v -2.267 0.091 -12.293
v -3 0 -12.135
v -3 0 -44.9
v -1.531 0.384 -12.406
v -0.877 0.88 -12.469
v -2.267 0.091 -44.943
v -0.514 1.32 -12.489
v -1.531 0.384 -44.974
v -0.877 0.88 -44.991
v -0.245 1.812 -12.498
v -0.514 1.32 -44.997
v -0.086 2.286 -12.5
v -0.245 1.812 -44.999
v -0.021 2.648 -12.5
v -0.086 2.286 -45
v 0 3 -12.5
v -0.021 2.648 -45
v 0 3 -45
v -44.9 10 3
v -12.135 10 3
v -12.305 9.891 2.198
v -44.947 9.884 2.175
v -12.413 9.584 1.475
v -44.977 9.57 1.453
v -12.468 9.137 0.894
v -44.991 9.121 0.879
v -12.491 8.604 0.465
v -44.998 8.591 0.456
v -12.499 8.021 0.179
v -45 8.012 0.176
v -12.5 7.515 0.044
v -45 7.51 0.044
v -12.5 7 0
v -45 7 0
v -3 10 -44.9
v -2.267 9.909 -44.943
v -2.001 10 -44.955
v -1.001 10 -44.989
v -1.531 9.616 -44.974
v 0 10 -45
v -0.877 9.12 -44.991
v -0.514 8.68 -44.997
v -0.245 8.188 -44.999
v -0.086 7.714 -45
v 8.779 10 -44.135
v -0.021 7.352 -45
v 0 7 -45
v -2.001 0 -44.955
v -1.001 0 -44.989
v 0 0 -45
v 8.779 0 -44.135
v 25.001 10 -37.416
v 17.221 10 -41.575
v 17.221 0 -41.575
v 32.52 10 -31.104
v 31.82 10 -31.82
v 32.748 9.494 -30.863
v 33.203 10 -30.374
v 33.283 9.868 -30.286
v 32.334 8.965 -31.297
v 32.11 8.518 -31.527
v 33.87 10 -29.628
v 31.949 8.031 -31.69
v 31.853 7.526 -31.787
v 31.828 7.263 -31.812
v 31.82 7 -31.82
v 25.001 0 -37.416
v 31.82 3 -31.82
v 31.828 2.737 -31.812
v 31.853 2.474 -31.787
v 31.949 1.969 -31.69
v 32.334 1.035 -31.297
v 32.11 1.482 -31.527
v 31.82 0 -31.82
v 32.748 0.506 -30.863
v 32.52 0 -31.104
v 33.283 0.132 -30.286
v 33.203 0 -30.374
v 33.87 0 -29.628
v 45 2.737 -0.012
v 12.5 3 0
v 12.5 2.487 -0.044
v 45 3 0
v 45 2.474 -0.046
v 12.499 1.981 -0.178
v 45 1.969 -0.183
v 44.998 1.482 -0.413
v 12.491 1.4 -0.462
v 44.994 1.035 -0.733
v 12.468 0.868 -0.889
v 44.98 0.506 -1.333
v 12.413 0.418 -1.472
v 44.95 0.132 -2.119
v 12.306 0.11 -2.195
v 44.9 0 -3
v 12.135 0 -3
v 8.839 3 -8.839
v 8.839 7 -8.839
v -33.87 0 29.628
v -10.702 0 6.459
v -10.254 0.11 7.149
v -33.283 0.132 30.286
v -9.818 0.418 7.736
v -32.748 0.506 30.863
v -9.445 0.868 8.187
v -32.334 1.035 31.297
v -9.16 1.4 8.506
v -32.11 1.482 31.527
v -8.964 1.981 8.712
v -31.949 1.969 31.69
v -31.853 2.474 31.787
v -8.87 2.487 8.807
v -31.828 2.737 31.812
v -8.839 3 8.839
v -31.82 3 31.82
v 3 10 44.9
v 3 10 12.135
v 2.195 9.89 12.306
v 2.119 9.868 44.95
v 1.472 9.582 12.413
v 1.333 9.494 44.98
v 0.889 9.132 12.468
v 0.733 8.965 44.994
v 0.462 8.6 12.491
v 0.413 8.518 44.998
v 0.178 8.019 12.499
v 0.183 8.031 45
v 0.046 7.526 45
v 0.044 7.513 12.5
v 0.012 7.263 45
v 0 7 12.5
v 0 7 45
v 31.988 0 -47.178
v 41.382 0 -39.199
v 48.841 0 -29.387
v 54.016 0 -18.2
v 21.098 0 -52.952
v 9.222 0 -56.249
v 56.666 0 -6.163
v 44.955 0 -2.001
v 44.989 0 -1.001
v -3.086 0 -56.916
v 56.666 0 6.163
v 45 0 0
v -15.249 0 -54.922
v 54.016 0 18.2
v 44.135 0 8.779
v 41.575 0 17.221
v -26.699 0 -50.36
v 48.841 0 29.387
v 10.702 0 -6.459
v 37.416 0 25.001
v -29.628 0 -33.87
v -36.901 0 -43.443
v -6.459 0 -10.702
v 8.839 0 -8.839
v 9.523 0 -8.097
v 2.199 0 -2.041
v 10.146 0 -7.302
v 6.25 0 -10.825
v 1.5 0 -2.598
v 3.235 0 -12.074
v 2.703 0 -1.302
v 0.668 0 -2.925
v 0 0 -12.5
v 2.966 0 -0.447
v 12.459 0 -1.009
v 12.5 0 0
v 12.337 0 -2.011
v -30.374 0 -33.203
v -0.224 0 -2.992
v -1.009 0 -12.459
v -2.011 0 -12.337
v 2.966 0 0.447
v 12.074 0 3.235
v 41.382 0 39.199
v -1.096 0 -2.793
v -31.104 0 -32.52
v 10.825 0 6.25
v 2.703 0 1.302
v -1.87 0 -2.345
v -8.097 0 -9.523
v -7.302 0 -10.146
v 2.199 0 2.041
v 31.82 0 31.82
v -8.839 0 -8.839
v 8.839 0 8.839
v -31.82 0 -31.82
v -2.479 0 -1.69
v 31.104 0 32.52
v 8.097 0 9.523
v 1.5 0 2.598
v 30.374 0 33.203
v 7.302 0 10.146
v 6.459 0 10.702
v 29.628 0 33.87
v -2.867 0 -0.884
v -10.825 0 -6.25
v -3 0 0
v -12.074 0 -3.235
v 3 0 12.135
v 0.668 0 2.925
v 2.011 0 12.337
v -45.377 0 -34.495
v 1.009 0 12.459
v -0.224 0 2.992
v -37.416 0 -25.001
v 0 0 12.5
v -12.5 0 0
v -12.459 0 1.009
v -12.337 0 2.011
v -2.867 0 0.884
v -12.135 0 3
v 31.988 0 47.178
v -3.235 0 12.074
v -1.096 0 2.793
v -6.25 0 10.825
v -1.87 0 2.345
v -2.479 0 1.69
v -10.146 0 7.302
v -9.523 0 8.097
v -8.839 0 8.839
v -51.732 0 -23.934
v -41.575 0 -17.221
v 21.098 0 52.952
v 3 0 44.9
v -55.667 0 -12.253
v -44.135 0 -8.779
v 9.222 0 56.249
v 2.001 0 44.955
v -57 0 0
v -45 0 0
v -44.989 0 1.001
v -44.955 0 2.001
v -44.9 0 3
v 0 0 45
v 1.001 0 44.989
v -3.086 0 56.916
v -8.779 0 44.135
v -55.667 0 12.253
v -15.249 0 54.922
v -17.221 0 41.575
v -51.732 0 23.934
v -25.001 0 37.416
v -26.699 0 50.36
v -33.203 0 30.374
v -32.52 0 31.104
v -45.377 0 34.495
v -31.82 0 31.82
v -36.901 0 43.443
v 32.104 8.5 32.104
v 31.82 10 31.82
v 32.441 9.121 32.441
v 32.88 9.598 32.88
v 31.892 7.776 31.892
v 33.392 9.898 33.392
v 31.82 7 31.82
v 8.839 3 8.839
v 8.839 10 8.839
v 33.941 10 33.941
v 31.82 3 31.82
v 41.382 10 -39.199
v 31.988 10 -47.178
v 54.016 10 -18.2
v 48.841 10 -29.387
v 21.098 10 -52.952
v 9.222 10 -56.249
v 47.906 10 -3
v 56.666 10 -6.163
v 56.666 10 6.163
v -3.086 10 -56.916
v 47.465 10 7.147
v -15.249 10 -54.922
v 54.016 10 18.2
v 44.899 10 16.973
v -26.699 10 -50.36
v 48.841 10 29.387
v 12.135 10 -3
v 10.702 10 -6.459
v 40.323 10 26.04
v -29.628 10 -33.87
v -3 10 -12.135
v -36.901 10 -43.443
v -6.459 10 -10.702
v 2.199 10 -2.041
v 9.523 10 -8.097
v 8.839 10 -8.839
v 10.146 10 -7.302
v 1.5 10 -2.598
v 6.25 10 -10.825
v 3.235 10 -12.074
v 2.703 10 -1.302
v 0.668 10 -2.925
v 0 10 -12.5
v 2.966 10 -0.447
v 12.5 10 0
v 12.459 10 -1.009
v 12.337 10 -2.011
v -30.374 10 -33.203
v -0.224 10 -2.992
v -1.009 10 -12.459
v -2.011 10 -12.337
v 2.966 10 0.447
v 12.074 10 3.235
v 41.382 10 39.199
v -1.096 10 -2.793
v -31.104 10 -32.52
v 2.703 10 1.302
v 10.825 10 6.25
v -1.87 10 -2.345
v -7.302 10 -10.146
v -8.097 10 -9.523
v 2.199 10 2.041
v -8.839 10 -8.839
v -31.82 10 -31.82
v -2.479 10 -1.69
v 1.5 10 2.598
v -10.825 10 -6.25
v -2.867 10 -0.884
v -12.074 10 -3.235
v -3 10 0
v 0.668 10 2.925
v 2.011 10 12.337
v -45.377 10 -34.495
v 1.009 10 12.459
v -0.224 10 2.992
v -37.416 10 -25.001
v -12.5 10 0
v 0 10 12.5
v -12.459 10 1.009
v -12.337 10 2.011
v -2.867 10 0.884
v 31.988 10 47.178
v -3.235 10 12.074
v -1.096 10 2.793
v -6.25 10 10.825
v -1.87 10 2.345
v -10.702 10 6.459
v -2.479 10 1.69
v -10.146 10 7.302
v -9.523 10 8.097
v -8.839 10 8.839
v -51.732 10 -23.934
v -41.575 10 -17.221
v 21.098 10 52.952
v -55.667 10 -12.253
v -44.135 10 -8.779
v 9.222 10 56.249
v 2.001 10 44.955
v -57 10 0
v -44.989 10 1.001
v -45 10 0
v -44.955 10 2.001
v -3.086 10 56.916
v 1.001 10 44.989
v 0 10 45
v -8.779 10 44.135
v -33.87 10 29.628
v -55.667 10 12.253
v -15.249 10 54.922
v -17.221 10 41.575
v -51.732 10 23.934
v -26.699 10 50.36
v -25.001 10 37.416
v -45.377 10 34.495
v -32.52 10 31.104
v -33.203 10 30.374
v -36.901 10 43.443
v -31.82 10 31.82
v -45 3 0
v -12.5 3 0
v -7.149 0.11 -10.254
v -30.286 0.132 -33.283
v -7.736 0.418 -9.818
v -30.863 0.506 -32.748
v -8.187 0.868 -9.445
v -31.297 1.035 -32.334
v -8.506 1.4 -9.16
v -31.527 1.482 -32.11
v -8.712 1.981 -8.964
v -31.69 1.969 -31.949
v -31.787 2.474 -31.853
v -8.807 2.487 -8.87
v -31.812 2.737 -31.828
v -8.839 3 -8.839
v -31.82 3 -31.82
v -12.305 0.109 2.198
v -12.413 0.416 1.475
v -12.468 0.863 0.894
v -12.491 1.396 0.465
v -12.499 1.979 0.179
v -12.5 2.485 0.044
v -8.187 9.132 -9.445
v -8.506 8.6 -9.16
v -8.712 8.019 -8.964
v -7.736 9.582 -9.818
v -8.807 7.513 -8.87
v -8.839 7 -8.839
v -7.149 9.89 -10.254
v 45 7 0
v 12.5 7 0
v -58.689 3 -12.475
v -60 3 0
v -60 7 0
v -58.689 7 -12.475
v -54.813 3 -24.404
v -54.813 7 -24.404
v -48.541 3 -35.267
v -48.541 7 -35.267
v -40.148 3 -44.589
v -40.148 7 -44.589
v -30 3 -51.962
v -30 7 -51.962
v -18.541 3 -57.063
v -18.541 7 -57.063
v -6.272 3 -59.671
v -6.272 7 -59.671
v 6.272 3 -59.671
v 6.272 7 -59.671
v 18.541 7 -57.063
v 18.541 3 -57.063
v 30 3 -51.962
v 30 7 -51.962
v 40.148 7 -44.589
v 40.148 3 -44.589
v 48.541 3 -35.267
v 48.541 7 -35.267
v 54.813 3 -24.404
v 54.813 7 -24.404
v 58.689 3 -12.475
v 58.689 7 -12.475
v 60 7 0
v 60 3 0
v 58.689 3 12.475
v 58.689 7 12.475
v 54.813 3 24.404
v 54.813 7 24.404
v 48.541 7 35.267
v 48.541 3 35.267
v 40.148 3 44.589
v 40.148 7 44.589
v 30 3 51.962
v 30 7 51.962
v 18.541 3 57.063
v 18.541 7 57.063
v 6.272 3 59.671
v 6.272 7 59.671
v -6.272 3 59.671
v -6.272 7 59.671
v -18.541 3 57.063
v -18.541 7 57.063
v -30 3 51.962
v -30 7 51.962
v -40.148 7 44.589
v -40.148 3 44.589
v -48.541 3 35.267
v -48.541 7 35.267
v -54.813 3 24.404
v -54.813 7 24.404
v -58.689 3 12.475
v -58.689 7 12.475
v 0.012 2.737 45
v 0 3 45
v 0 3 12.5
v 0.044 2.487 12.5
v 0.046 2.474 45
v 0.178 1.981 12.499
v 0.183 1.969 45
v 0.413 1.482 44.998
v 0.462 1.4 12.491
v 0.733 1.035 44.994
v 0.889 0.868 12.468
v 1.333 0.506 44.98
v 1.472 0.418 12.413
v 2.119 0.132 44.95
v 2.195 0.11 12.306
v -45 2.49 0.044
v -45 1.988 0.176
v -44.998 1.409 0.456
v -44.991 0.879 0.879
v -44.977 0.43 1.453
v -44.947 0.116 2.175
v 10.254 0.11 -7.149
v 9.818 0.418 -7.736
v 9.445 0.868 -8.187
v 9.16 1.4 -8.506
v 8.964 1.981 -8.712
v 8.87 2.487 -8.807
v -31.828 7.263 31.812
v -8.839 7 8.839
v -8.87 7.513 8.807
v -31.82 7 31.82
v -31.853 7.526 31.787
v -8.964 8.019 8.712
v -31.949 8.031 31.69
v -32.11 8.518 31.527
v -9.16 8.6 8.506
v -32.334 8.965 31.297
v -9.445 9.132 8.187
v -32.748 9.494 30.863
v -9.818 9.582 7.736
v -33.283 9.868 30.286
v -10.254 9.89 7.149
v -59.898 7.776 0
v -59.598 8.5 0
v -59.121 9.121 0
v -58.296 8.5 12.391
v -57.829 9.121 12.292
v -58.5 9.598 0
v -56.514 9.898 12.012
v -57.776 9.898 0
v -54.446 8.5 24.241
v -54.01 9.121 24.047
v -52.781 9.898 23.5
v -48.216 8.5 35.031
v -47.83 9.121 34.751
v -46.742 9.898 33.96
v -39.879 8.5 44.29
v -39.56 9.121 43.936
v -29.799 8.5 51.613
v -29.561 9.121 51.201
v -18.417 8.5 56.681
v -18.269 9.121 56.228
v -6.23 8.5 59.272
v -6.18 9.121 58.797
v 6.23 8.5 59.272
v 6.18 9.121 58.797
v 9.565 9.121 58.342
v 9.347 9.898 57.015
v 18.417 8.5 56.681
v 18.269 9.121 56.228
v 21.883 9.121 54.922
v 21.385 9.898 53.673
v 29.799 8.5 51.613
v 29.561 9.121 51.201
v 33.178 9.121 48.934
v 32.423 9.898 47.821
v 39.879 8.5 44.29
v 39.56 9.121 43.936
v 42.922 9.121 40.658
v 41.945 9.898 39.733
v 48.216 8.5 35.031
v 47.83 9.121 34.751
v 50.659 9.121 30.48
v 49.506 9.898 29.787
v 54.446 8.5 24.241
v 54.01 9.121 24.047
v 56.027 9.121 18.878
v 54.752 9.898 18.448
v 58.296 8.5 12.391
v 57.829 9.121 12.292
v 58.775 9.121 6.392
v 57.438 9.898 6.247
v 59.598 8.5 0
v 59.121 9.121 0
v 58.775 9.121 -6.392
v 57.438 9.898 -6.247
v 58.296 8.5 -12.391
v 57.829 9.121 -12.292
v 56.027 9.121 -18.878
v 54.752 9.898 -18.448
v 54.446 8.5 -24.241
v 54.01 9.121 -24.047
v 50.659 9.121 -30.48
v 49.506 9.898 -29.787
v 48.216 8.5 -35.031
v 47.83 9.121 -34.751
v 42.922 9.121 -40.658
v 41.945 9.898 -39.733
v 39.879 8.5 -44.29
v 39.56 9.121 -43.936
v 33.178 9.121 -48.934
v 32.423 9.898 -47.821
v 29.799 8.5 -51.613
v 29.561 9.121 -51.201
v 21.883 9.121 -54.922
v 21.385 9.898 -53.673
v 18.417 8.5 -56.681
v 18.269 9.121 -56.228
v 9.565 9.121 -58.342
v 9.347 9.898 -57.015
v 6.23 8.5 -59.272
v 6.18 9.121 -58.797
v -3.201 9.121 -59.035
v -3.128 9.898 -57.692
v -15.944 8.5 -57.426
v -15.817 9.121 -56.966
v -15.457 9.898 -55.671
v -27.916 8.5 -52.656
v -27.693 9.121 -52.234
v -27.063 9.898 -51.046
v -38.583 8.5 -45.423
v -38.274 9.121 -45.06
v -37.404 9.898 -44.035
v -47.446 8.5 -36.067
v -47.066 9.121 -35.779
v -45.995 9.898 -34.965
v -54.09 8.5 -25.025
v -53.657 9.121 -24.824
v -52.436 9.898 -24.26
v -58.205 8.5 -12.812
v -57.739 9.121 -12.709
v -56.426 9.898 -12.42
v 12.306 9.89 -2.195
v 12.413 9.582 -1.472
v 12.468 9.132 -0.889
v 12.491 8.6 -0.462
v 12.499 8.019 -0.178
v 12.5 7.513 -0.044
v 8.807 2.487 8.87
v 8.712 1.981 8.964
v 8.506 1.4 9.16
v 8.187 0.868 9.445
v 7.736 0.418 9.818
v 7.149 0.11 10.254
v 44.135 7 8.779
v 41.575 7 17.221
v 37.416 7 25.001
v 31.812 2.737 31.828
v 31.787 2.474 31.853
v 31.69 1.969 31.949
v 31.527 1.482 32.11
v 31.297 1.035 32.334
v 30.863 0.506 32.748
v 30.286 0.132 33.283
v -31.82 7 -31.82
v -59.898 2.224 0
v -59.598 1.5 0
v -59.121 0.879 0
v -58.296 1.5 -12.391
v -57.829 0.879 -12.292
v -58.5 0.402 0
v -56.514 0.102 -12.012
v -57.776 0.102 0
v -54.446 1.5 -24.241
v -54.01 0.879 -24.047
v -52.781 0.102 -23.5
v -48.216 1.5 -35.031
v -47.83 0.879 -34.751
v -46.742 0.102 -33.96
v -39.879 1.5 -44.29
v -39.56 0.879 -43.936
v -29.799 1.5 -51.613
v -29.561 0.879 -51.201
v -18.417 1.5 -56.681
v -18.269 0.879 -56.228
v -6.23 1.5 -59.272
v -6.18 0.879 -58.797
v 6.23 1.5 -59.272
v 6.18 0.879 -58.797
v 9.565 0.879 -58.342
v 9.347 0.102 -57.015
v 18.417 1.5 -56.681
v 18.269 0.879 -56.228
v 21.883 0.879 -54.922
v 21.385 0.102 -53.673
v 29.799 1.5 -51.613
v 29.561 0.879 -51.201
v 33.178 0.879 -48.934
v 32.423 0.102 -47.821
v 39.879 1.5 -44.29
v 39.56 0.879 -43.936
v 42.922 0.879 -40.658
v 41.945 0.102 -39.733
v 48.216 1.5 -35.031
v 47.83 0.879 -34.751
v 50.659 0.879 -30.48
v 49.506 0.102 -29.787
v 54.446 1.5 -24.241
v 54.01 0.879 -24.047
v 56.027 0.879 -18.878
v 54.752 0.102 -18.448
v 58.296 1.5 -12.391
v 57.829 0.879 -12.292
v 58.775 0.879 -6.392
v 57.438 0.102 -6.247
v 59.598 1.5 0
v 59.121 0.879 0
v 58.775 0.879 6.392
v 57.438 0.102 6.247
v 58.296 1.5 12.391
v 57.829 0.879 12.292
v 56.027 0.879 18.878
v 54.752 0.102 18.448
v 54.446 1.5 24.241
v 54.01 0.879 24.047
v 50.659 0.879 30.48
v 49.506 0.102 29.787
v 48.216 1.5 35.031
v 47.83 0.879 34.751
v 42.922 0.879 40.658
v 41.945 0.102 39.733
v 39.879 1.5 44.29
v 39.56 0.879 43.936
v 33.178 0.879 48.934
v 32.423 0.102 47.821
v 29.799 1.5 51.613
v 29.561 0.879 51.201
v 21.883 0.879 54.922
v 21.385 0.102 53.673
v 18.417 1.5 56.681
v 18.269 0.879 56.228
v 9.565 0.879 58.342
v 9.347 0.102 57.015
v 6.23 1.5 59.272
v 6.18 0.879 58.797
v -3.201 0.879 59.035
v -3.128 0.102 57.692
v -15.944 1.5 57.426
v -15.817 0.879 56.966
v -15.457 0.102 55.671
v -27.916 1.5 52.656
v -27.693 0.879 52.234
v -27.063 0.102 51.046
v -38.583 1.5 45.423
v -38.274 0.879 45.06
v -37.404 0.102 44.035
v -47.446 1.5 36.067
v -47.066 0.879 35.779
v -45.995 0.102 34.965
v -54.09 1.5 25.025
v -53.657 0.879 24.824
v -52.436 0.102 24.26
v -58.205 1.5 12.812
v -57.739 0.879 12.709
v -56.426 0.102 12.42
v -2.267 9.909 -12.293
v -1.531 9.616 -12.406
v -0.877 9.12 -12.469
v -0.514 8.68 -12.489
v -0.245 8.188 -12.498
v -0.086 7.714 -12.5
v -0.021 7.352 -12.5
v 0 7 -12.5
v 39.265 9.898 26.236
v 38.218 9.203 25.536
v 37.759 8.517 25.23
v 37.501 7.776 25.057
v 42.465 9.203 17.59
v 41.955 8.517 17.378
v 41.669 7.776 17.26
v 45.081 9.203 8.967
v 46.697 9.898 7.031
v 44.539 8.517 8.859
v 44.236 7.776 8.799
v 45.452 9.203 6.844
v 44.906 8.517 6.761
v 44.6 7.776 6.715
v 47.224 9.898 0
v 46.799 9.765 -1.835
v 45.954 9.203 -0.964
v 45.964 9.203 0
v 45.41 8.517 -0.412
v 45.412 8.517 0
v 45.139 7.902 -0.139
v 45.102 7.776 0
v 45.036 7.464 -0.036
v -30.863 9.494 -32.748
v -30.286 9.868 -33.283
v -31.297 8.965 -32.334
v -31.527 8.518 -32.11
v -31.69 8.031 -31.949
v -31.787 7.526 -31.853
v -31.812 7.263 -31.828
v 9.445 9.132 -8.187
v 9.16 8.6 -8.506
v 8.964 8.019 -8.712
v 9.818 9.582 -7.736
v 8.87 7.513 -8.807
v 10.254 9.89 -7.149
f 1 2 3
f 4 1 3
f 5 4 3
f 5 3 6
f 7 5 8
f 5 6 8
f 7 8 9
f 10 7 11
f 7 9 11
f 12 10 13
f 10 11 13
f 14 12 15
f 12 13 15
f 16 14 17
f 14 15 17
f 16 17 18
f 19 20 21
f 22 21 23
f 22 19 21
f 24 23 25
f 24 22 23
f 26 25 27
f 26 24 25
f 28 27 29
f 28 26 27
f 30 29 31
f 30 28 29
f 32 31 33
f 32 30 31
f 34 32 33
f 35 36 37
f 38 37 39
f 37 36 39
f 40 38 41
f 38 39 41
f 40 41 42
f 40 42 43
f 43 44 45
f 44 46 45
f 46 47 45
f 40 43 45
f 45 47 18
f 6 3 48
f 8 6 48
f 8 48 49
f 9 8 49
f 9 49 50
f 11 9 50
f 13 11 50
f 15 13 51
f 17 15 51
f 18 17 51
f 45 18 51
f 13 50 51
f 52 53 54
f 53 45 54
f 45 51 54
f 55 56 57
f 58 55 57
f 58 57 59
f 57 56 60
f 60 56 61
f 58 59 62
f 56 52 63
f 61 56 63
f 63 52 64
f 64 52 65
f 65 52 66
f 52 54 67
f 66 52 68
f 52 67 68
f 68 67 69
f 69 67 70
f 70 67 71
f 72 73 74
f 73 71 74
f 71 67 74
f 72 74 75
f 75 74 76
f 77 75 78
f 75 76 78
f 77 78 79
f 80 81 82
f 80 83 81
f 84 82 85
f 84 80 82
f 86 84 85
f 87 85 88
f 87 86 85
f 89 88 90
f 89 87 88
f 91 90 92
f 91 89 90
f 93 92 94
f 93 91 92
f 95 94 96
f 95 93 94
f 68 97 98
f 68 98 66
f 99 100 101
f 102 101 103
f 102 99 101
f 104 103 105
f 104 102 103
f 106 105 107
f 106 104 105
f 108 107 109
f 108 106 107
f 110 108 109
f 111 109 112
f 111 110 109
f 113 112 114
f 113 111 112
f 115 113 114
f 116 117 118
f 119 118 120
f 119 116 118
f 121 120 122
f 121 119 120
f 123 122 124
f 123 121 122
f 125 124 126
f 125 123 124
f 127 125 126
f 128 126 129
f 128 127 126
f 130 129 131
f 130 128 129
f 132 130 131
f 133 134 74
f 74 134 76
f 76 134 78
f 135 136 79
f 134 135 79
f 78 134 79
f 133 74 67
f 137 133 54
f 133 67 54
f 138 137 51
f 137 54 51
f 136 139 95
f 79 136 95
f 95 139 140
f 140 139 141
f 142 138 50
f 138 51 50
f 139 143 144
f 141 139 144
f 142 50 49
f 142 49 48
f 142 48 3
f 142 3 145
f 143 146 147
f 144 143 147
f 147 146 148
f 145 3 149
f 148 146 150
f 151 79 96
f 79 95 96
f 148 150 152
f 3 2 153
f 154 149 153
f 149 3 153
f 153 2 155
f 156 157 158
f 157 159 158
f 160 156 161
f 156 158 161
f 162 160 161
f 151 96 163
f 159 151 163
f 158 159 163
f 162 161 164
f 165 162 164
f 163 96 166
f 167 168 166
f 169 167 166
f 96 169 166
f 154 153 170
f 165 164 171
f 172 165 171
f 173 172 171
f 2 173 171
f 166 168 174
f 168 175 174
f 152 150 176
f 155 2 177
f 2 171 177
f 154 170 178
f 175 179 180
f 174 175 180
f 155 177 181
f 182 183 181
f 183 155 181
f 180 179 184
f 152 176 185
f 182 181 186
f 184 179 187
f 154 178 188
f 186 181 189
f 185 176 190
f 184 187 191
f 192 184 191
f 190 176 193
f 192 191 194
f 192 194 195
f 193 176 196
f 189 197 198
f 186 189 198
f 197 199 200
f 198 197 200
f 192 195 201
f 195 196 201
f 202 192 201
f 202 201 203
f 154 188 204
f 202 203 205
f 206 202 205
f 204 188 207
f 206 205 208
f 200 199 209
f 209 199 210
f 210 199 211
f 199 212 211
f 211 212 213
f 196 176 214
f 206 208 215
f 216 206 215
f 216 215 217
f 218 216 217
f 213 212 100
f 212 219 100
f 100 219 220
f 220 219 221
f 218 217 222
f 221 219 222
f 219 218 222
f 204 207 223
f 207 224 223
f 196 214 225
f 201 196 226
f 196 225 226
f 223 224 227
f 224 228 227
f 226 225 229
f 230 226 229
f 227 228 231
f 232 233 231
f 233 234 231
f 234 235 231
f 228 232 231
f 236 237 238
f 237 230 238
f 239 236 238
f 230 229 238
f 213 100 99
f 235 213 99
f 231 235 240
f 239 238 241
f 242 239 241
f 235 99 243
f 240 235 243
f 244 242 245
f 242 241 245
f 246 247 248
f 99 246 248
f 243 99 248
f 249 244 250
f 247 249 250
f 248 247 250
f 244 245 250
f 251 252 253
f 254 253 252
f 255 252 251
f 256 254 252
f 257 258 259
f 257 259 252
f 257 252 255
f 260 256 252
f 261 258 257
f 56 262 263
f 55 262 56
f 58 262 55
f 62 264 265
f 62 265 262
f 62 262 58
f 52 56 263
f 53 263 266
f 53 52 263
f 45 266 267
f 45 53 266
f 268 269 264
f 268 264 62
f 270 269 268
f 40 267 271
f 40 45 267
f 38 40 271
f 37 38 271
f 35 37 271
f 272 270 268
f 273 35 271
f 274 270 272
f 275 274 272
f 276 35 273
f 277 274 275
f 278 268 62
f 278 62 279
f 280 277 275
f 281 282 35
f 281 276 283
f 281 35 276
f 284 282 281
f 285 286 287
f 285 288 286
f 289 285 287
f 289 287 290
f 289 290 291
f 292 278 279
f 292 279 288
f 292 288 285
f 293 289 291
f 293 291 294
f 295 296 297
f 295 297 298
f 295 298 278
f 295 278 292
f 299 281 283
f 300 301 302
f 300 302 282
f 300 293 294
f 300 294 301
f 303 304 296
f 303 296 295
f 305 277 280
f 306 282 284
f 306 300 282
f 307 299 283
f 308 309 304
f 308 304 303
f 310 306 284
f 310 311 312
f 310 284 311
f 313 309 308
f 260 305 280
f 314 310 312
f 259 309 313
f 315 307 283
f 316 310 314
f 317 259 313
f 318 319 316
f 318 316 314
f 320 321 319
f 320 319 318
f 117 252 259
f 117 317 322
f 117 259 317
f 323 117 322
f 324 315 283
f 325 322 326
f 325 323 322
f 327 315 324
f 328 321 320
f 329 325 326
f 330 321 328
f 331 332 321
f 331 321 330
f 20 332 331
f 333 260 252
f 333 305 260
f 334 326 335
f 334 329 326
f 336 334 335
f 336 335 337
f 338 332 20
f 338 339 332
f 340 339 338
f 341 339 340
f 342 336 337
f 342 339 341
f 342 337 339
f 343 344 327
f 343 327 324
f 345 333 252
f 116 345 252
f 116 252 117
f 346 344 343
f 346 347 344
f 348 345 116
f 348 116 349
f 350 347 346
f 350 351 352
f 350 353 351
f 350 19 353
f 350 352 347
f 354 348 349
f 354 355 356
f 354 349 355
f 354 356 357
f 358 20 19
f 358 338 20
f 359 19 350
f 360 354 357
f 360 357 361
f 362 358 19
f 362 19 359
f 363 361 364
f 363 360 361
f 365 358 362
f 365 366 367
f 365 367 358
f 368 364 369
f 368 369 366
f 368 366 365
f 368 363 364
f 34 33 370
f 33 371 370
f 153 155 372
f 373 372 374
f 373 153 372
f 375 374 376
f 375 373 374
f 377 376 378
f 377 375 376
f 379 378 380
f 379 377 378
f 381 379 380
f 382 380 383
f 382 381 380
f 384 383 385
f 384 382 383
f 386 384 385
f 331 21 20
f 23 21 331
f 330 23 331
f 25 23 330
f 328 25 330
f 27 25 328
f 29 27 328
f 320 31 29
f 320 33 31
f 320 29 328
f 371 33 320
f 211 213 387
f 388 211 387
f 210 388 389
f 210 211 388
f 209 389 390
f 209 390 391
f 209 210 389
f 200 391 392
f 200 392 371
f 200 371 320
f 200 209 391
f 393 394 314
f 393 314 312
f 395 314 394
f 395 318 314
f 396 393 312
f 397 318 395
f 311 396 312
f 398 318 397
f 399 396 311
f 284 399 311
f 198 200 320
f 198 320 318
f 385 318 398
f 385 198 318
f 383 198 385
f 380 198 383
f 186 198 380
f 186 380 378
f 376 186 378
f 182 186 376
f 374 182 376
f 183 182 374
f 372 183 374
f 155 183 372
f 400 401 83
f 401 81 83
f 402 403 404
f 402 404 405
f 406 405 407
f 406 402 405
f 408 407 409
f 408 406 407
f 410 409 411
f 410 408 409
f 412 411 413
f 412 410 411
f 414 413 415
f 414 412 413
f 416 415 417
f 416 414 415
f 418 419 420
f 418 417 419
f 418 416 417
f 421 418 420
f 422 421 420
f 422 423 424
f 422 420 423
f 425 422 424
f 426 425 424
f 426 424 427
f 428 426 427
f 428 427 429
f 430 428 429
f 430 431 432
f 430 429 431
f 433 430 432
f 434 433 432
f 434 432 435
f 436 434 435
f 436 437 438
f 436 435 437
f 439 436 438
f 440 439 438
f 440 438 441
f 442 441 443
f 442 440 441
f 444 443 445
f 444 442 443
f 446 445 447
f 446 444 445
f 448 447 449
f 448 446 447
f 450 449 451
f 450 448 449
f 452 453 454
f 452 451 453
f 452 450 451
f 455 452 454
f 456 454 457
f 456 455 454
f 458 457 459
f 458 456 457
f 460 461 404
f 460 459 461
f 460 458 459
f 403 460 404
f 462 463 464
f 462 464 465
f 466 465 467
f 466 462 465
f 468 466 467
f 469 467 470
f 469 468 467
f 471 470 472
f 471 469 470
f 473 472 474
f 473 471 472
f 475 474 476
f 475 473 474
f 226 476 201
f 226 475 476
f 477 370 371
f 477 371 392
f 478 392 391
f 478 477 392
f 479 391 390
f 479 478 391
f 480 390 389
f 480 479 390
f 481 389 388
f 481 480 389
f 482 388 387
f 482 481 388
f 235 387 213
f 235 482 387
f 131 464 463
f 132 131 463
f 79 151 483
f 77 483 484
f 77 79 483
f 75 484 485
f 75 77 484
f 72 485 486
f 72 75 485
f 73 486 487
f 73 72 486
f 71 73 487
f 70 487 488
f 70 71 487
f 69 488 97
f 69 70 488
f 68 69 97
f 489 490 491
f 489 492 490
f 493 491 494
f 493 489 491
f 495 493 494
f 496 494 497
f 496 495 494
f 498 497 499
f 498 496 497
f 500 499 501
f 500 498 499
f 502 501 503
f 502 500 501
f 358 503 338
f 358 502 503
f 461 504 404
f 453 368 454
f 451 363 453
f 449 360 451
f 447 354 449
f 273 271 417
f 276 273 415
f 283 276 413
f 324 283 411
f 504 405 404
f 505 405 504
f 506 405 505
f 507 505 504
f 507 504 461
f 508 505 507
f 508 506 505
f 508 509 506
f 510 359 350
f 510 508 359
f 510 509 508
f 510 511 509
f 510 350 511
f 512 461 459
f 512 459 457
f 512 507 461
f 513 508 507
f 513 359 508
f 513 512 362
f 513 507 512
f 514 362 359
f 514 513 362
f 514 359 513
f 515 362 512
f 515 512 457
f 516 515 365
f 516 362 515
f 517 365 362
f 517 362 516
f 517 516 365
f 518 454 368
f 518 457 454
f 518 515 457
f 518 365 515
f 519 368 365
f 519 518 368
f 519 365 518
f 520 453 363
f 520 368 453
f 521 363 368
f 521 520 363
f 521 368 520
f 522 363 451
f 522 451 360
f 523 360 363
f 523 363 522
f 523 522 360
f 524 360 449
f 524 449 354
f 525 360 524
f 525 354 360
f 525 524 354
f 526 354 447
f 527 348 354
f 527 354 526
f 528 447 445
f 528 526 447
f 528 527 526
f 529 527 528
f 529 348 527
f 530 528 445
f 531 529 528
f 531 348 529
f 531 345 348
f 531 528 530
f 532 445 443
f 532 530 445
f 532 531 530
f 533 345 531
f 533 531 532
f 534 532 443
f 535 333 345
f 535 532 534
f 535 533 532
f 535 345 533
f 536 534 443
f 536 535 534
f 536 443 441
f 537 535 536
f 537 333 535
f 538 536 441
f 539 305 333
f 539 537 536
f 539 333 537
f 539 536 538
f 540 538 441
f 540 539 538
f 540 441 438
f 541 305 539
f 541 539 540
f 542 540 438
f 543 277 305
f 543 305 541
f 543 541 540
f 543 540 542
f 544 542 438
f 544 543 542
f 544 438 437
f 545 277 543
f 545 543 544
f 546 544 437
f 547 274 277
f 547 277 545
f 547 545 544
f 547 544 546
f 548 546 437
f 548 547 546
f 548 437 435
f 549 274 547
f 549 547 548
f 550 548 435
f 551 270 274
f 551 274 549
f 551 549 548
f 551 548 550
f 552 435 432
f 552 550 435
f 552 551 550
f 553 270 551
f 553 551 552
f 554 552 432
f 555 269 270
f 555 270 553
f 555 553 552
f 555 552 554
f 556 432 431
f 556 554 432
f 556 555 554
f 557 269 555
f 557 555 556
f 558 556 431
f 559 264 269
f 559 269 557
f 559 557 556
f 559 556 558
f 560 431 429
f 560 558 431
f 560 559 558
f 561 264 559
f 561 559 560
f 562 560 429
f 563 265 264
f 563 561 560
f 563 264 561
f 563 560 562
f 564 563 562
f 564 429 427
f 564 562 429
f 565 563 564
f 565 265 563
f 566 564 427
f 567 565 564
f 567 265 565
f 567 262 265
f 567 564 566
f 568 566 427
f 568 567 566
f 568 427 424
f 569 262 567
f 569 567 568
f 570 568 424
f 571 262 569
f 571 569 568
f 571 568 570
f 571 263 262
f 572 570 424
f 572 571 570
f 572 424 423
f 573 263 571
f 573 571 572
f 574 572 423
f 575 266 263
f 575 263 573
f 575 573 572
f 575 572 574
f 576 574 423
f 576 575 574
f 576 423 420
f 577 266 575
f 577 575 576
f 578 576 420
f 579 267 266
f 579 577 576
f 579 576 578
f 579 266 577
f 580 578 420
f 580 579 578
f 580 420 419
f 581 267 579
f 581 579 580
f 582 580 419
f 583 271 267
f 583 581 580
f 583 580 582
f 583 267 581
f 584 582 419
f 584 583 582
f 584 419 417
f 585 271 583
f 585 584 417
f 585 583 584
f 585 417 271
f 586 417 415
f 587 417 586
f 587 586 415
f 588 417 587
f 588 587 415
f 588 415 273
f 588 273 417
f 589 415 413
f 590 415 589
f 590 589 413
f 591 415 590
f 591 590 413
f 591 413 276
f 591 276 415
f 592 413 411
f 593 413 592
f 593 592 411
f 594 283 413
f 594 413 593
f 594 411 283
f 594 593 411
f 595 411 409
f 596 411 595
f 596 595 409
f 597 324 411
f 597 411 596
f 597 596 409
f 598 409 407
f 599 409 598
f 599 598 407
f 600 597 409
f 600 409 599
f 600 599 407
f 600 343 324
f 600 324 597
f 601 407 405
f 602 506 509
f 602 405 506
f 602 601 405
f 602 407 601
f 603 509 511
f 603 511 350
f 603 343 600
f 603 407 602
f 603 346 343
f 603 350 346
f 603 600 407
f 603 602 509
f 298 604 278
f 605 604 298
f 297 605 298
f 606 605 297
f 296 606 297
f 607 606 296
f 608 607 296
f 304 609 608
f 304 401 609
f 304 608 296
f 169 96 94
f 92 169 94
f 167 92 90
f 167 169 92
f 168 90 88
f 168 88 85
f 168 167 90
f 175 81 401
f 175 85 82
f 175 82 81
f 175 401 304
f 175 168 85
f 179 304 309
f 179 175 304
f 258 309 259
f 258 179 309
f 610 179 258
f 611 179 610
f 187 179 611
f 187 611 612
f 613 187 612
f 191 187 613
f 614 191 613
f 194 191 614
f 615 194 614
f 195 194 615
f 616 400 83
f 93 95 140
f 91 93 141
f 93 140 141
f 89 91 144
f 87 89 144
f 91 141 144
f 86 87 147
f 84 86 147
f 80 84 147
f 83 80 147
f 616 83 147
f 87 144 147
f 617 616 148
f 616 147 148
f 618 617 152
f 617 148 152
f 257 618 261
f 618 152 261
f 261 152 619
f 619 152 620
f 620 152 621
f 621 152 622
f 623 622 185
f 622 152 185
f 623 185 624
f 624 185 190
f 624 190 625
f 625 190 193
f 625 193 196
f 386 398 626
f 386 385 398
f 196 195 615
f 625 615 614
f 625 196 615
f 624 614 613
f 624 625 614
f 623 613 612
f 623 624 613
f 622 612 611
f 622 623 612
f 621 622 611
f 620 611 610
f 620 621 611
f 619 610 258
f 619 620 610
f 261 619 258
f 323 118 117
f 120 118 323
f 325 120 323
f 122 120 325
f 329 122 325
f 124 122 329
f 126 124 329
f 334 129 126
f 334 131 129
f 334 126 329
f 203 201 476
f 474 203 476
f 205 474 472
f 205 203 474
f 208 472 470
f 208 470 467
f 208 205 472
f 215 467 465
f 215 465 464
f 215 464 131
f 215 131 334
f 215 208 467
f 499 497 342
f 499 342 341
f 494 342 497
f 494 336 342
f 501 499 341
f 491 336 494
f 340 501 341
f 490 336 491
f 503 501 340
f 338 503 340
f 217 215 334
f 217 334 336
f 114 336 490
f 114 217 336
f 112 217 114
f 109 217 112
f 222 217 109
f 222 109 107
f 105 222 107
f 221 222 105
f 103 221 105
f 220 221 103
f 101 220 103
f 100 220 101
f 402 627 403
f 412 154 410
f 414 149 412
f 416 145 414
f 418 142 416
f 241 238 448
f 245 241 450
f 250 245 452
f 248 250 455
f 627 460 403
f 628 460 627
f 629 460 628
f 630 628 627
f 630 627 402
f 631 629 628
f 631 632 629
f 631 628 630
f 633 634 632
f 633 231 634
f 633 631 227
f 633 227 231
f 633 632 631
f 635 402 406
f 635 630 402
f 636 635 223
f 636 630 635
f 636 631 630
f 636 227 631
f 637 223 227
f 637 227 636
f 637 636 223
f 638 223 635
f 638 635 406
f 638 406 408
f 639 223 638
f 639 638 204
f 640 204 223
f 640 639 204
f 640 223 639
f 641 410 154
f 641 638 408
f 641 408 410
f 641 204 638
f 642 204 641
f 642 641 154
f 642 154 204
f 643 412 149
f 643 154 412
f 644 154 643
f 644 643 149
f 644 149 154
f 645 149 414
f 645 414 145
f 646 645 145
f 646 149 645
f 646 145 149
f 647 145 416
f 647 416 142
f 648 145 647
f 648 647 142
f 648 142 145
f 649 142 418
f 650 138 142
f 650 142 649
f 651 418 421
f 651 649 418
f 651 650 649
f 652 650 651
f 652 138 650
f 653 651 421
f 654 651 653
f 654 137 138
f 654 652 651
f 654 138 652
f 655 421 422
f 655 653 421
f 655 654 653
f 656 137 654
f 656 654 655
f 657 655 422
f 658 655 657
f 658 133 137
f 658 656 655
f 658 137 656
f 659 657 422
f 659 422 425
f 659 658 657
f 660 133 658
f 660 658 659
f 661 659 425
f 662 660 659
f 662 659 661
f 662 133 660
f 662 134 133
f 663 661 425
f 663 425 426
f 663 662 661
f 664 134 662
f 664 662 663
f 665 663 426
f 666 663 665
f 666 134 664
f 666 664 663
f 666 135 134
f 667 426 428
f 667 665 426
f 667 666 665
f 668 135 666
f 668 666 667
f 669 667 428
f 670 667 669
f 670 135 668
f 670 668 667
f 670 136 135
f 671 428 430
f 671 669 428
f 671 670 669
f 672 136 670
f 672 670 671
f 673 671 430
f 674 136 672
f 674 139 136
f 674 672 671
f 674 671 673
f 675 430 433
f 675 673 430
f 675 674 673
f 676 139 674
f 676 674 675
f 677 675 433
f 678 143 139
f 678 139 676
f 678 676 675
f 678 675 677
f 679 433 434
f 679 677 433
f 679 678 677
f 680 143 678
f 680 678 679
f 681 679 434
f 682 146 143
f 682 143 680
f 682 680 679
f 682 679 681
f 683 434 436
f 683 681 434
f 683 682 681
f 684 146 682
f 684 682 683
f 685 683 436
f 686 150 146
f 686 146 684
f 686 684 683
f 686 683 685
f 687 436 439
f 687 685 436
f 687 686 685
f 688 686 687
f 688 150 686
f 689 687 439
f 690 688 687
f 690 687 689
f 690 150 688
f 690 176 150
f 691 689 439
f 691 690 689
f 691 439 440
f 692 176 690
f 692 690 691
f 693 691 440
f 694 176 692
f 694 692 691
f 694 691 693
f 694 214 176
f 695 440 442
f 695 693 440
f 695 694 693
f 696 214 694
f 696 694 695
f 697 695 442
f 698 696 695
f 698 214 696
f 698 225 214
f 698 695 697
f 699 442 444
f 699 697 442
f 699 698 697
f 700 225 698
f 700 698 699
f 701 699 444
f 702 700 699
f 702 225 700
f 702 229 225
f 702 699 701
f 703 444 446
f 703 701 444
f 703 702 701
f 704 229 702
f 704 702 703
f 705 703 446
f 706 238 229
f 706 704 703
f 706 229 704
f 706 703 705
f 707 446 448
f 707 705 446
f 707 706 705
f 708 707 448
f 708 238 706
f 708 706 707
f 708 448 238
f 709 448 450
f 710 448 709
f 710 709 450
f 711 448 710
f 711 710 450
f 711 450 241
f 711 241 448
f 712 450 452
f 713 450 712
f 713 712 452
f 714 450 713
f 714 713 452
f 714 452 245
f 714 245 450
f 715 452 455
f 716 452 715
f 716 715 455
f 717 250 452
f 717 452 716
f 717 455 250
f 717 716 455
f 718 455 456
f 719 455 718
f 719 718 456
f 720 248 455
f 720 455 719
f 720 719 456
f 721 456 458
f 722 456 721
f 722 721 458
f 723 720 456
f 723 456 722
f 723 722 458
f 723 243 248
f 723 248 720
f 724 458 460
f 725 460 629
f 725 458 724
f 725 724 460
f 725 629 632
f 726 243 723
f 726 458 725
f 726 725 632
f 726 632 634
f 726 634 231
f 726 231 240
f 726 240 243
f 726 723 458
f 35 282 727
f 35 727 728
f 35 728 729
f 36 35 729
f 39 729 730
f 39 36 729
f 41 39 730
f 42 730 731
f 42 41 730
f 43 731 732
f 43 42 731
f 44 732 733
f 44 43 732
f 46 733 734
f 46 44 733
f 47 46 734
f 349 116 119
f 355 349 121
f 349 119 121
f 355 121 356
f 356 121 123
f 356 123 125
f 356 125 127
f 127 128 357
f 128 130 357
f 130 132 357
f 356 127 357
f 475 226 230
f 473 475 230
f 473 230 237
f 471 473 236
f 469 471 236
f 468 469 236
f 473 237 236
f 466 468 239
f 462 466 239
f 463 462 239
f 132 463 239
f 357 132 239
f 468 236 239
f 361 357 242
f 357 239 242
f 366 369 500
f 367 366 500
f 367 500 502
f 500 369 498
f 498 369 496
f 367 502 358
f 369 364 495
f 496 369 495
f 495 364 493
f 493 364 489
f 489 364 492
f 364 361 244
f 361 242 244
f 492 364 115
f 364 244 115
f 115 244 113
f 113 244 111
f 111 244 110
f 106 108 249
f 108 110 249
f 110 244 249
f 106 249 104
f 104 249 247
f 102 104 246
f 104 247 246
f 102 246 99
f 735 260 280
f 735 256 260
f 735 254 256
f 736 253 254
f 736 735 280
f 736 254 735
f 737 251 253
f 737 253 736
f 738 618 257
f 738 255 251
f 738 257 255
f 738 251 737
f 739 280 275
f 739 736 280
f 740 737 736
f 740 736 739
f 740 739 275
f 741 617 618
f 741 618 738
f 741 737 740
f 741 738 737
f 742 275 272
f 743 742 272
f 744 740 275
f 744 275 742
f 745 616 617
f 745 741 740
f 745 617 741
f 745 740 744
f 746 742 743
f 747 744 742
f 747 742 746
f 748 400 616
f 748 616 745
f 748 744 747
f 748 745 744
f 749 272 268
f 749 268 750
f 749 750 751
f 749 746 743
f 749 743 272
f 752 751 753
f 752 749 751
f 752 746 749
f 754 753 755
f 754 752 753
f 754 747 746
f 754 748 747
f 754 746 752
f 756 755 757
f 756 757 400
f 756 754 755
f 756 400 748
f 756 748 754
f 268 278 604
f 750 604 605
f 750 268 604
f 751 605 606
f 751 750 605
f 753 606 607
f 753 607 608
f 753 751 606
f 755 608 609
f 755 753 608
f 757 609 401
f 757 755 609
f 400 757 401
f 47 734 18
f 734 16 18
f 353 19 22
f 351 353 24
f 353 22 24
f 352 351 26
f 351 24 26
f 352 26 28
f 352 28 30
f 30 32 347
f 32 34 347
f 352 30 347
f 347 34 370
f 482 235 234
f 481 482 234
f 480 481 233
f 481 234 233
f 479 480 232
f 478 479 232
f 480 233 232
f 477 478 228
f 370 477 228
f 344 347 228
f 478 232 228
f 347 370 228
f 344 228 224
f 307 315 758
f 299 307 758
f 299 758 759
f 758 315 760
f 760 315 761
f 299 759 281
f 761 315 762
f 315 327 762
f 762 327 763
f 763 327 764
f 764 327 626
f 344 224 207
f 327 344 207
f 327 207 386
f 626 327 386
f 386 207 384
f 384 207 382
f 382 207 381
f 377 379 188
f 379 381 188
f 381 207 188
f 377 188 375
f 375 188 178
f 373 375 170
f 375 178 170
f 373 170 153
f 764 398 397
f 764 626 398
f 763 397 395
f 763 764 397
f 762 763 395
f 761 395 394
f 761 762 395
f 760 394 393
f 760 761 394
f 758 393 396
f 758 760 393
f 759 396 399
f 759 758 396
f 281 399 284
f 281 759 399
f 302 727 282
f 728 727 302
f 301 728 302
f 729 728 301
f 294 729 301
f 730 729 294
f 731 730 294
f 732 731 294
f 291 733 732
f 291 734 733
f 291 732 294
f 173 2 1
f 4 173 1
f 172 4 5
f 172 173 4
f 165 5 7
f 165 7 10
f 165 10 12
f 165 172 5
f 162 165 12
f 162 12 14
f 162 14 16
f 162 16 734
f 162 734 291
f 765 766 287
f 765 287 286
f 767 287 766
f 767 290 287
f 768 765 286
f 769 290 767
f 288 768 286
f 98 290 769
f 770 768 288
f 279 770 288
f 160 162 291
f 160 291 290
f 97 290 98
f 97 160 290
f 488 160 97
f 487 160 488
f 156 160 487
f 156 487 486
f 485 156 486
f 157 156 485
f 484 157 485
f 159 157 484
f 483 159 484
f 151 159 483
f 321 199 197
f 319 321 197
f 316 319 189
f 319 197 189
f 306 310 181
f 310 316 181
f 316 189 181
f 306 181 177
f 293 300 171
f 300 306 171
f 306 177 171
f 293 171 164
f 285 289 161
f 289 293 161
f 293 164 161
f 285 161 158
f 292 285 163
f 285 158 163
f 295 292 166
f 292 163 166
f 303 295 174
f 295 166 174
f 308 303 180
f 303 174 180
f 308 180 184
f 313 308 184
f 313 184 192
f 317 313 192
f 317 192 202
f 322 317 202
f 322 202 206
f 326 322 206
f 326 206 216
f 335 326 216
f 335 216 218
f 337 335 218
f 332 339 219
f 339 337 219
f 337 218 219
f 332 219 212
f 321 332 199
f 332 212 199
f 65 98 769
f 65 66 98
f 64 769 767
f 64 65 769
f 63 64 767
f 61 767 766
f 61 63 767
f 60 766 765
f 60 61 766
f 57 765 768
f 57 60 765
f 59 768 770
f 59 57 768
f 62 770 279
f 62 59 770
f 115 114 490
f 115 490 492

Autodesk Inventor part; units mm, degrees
ref_plane "YZ Plane" through (0, 0, 0) normal (1, 0, 0) x (0, 1, 0)
ref_plane "XZ Plane" through (0, 0, 0) normal (0, 1, 0) x (-1, 0, 0)
ref_plane "XY Plane" through (0, 0, 0) normal (0, 0, 1) x (1, 0, 0)
sketch "Sketch1" plane through (0, 0, 0) normal (0, 1, 0) x (-1, 0, 0)
  circle A0 centre (0, 0) radius 3
  circle A1 centre (0, 0) radius 60
  circle A2 centre (0, 0) radius 12.5
  circle A3 centre (0, 0) radius 45
  line L0 (0, -12.5) -> (0, -45)
  line L1 (0, 12.5) -> (0, 45)
  line L2 (-12.5, 0) -> (-45, 0)
  line L3 (12.5, 0) -> (45, 0)
  line L4 (0, 0) -> (5, 0) construction
  line L5 (-8.8388, -8.8388) -> (-31.8198, -31.8198)
  line L6 (8.8388, 8.8388) -> (31.8198, 31.8198)
  line L7 (0, 0) -> (40, 0) construction
  line L8 (-8.8388, 8.8388) -> (-31.8198, 31.8198)
  line L9 (8.8388, -8.8388) -> (31.8198, -31.8198)
  dimension "d4" = 25
  dimension "d5" = 90
  dimension "d0" = 6
  dimension "d1" = 120
  dimension "d7" = 45
extrude "Extrusion1" add sketch "Sketch1" along normal blind 10 contours A1 | A2 | L3 A3 L9 A2 | A2 L6 A3 L3 | A2 L1 A3 L6 | L9 A3 L0 A2 | A2 L8 A3 L1 | L0 A3 L5 A2 | A2 L2 A3 L8 | L5 A3 L2 A2
extrude "Extrusion2" cut sketch "Sketch1" along normal blind 10 contours L3 A3 L9 A2 | A2 L1 A3 L6 | L0 A3 L5 A2 | A2 L2 A3 L8
fillet "Fillet1" radius 3 2 edges at (60, 0, 0) (60, 10, 0)
fillet "Fillet2" radius 3 16 edges at (28.75, 0, 0) (20.3293, 0, 20.3293) (-20.3293, 0, 20.3293) (-28.75, 0, 0) (-20.3293, 0, -20.3293) (0, 0, -28.75) (20.3293, 0, -20.3293) (41.5746, 10, 17.2208) (20.3293, 10, -20.3293) (0, 10, -28.75) (-20.3293, 10, -20.3293) (-28.75, 10, 0) (-20.3293, 10, 20.3293) (0, 10, 28.75) (28.75, 10, 0) (0, 0, 28.75)
properties part number "roda_mdf"
